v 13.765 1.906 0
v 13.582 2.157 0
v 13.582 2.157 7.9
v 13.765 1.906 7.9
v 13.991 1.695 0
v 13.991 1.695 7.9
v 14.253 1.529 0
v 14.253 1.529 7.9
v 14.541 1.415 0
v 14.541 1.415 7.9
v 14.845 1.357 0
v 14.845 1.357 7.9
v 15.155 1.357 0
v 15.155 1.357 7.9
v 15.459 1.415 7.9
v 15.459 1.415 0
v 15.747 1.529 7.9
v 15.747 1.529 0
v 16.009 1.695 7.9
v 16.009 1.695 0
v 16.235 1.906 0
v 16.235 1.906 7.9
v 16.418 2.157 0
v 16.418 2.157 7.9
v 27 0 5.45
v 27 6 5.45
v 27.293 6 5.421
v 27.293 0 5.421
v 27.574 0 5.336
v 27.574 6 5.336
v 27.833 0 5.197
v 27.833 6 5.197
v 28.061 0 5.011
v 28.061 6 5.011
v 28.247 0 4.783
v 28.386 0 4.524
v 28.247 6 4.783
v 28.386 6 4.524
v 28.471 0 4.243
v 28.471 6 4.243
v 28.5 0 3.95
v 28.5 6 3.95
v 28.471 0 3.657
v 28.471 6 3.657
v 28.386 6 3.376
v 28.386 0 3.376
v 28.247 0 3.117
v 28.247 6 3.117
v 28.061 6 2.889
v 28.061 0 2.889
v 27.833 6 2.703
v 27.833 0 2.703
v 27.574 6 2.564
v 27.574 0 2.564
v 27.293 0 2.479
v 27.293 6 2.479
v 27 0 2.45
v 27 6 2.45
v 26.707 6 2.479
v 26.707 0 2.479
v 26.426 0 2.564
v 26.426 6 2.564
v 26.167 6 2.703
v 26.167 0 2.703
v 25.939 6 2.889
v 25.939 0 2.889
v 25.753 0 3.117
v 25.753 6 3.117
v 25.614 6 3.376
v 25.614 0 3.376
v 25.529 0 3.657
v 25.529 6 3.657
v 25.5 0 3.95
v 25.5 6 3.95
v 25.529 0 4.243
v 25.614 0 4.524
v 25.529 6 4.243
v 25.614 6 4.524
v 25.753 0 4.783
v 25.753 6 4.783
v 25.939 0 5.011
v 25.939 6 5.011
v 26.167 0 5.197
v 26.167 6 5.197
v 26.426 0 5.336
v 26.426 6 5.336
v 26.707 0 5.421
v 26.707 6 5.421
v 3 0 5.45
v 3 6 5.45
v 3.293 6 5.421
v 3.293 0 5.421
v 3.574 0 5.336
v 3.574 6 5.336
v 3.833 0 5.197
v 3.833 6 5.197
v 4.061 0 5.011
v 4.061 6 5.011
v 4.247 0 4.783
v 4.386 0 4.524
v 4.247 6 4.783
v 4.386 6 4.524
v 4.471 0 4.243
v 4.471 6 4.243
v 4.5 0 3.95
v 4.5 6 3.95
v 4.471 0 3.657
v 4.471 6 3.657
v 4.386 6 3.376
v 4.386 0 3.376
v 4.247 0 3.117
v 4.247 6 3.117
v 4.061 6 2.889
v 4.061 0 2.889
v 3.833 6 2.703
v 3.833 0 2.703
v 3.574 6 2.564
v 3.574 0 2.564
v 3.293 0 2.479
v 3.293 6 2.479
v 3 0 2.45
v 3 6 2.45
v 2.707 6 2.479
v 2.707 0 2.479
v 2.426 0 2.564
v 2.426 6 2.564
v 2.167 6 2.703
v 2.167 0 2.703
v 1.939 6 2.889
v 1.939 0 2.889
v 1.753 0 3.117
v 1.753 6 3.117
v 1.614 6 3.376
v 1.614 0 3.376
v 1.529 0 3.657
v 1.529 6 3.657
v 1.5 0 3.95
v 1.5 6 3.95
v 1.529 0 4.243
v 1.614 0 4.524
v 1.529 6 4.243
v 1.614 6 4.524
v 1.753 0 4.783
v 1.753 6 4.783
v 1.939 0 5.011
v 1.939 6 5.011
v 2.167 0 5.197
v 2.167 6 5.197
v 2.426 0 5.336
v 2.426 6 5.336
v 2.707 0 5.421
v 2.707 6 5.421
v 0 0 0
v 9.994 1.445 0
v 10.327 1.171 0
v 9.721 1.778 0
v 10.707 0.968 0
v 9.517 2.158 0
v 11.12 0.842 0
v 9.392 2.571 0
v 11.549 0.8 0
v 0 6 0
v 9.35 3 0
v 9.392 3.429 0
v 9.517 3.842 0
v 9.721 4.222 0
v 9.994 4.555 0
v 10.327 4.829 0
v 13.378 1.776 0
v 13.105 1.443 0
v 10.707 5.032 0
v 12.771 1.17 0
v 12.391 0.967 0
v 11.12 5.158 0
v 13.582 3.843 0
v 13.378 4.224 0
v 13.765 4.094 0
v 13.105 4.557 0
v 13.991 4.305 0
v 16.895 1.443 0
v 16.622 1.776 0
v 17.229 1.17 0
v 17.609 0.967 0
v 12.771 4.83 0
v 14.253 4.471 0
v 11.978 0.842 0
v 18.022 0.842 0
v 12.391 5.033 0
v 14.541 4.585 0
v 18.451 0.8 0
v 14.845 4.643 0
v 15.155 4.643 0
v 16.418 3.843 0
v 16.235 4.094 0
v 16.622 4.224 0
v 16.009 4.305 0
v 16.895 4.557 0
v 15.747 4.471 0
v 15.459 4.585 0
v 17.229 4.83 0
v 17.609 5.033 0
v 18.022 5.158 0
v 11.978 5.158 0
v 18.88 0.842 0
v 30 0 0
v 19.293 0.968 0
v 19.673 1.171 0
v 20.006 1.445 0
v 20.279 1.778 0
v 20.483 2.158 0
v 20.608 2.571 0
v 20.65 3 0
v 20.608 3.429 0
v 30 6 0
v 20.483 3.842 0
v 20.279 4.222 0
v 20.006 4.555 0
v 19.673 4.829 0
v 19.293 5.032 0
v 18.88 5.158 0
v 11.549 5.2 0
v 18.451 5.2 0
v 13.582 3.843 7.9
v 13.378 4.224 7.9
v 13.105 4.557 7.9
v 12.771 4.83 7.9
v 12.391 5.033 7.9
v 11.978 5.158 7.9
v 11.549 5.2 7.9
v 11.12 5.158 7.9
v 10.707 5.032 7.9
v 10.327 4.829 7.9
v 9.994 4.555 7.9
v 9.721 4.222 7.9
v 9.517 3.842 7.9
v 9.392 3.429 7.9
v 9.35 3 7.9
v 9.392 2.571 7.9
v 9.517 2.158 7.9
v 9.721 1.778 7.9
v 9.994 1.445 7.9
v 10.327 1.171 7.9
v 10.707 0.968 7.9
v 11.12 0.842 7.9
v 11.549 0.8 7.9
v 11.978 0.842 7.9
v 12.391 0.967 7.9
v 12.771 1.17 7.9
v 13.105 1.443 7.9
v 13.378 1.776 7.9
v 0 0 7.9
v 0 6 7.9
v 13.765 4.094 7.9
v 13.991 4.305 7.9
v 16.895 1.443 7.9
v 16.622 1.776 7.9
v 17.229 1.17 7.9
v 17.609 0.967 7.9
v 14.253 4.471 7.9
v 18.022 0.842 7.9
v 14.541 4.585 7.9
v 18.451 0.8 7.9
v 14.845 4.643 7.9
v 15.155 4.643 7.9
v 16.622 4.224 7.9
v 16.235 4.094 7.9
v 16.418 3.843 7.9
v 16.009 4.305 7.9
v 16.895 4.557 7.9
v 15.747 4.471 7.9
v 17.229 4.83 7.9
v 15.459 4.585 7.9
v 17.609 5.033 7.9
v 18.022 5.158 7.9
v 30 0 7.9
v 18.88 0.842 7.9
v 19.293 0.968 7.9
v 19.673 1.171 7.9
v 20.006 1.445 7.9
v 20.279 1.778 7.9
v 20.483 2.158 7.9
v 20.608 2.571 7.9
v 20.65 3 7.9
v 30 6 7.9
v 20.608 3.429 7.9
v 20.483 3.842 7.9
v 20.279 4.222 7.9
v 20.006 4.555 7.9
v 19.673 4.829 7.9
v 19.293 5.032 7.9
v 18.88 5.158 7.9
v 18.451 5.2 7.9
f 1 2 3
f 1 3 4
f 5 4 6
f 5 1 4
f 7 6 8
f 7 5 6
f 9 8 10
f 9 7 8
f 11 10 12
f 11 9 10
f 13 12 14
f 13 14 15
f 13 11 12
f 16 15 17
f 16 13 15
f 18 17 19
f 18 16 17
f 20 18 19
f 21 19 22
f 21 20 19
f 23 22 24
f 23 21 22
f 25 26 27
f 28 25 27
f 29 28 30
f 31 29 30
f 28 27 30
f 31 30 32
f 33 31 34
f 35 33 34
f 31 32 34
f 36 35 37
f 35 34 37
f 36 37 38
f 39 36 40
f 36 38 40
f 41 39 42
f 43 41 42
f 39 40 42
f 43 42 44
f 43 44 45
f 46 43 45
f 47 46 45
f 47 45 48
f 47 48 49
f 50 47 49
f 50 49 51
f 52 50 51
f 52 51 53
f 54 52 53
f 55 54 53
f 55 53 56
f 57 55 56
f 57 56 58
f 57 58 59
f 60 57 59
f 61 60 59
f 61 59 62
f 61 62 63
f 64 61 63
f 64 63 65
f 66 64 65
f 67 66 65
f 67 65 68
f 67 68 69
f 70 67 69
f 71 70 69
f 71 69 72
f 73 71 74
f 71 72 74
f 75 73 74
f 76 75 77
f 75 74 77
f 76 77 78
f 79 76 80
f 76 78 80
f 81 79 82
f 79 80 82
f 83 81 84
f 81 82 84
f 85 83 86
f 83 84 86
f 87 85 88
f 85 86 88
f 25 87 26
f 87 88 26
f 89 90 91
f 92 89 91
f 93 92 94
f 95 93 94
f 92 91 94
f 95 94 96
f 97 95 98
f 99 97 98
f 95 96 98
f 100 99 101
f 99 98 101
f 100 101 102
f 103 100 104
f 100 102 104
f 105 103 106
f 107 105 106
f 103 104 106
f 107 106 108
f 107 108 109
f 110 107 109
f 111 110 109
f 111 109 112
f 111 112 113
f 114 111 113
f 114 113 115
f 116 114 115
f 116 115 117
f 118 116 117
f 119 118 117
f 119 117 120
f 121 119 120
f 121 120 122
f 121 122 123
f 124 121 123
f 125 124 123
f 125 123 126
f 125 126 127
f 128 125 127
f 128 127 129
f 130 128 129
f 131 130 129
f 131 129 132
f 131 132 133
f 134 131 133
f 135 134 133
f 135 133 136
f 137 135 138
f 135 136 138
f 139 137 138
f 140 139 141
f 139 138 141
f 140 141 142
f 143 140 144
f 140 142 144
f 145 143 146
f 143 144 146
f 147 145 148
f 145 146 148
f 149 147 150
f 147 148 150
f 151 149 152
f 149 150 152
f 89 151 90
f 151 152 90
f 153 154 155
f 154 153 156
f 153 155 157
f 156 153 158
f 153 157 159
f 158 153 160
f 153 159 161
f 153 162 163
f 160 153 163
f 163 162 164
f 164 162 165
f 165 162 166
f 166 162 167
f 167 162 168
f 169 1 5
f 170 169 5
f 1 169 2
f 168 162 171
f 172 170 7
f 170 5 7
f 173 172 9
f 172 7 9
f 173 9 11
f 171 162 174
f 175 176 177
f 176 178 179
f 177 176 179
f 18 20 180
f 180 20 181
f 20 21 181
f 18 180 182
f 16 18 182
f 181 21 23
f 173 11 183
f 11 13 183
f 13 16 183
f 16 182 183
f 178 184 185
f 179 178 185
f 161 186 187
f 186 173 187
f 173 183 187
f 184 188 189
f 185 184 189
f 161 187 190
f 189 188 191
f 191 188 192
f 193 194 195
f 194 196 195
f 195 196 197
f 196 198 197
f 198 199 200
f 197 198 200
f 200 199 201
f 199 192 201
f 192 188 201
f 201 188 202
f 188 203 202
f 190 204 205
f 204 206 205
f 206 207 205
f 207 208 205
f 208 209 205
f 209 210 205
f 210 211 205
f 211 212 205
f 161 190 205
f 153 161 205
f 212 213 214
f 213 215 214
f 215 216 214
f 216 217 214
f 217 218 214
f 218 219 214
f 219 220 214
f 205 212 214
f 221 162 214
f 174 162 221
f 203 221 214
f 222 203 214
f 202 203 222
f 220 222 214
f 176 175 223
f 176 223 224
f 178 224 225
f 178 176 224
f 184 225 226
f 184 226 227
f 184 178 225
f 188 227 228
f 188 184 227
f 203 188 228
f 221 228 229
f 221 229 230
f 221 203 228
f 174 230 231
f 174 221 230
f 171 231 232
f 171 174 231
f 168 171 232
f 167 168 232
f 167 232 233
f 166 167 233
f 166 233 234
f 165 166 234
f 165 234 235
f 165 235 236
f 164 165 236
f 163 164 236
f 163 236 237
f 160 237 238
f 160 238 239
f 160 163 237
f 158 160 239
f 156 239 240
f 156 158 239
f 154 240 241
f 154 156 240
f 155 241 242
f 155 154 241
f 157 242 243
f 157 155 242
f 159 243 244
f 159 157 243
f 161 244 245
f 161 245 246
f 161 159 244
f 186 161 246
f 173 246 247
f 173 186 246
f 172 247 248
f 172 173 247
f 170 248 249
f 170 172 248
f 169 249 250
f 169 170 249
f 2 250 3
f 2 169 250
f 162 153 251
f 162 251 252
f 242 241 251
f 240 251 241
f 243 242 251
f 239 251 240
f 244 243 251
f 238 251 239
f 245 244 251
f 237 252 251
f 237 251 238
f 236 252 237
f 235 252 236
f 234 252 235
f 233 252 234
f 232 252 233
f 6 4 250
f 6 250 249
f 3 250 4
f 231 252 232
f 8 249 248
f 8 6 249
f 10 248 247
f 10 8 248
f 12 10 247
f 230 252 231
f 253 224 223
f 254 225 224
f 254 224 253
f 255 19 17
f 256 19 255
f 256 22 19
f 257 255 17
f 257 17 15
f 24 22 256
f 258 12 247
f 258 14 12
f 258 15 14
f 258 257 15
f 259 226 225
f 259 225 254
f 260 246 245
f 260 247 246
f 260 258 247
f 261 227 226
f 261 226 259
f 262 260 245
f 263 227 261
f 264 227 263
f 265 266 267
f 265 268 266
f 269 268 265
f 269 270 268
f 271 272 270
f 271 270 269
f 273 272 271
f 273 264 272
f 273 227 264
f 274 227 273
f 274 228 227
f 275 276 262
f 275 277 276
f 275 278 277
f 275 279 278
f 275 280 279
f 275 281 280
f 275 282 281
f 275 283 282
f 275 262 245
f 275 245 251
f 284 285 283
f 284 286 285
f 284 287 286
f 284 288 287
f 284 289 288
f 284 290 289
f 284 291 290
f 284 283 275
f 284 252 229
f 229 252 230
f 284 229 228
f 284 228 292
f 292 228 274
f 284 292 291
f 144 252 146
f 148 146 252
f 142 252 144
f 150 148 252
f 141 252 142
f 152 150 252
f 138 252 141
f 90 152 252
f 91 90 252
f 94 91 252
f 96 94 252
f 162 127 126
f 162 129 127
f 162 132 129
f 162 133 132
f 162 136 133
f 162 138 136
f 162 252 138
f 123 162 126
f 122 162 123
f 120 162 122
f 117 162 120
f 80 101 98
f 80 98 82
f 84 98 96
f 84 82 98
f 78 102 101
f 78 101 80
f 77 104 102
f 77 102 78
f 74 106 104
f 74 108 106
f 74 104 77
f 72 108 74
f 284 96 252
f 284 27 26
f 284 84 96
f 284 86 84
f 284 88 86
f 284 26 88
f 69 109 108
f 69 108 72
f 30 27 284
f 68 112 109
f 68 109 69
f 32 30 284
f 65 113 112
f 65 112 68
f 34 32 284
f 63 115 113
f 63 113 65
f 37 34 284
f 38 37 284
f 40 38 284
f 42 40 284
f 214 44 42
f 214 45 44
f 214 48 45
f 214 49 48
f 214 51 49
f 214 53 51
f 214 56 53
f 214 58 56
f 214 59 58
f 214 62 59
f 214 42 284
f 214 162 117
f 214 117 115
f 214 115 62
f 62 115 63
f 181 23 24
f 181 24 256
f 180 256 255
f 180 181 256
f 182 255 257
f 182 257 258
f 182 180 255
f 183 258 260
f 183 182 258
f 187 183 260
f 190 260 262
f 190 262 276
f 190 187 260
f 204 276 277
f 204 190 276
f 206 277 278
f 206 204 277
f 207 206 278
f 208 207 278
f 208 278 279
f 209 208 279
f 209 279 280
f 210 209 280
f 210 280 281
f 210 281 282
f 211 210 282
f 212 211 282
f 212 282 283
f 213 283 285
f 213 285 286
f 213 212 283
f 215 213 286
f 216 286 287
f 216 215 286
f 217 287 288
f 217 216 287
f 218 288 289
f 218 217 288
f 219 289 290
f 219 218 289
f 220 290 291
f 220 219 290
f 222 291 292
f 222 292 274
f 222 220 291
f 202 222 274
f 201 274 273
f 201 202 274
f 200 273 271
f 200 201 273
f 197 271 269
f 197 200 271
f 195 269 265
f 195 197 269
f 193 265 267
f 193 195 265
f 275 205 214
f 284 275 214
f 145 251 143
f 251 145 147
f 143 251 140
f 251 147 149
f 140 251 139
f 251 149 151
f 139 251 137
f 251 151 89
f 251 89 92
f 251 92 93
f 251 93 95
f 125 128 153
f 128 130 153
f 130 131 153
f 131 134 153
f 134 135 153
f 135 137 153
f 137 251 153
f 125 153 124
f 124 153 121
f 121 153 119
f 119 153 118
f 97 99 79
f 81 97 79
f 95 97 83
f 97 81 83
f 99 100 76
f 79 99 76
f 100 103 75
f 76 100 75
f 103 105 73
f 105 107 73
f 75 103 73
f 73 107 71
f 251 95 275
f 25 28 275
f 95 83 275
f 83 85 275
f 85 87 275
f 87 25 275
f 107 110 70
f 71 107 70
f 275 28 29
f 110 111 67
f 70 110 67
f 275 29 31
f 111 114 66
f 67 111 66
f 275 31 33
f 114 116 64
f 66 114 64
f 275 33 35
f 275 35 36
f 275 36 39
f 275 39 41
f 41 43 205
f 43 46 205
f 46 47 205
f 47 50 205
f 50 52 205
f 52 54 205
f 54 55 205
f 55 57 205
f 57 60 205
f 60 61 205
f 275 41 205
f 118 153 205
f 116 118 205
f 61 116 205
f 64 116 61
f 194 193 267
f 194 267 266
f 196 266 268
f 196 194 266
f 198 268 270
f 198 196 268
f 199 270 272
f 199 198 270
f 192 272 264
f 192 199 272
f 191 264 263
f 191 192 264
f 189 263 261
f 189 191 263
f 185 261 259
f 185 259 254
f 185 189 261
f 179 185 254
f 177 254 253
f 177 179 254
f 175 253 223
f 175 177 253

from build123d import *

# Parameters (mm, degrees)
SKETCH1_W           = 30
SKETCH1_H           = 6
BOSS_EXTRUDE1_DEPTH = 7.9
SKETCH2_R           = 1.5
CUT_EXTRUDE1_DEPTH  = 32.597626493


with BuildPart() as part:
    # Sketch1 → Boss-Extrude1 (new body)
    with BuildSketch(Plane.XY):
        with Locations((15, 3)):
            Rectangle(SKETCH1_W, SKETCH1_H)
        with BuildLine():
            ThreePointArc((13.581884058, 3.843473281), (9.35, 3), (13.581884058, 2.156526719))
            ThreePointArc((13.581884058, 2.156526719), (15, 1.35), (16.418115942, 2.156526719))
            ThreePointArc((16.418115942, 2.156526719), (20.65, 3), (16.418115942, 3.843473281))
            ThreePointArc((16.418115942, 3.843473281), (15, 4.65), (13.581884058, 3.843473281))
        make_face(mode=Mode.SUBTRACT)
    extrude(amount=BOSS_EXTRUDE1_DEPTH)

    # Sketch2 → Cut-Extrude1 (cut, through all)
    with BuildSketch(Plane(origin=(0, 6, 0), x_dir=(1, 0, 0), z_dir=(0, 1, 0))):
        with Locations(Location((3, -3.95, 0), (0, 0, 270))):
            Circle(SKETCH2_R)
        with Locations(Location((27, -3.95, 0), (0, 0, 270))):
            Circle(SKETCH2_R)
    extrude(amount=-CUT_EXTRUDE1_DEPTH, mode=Mode.SUBTRACT)


solid = part.part
